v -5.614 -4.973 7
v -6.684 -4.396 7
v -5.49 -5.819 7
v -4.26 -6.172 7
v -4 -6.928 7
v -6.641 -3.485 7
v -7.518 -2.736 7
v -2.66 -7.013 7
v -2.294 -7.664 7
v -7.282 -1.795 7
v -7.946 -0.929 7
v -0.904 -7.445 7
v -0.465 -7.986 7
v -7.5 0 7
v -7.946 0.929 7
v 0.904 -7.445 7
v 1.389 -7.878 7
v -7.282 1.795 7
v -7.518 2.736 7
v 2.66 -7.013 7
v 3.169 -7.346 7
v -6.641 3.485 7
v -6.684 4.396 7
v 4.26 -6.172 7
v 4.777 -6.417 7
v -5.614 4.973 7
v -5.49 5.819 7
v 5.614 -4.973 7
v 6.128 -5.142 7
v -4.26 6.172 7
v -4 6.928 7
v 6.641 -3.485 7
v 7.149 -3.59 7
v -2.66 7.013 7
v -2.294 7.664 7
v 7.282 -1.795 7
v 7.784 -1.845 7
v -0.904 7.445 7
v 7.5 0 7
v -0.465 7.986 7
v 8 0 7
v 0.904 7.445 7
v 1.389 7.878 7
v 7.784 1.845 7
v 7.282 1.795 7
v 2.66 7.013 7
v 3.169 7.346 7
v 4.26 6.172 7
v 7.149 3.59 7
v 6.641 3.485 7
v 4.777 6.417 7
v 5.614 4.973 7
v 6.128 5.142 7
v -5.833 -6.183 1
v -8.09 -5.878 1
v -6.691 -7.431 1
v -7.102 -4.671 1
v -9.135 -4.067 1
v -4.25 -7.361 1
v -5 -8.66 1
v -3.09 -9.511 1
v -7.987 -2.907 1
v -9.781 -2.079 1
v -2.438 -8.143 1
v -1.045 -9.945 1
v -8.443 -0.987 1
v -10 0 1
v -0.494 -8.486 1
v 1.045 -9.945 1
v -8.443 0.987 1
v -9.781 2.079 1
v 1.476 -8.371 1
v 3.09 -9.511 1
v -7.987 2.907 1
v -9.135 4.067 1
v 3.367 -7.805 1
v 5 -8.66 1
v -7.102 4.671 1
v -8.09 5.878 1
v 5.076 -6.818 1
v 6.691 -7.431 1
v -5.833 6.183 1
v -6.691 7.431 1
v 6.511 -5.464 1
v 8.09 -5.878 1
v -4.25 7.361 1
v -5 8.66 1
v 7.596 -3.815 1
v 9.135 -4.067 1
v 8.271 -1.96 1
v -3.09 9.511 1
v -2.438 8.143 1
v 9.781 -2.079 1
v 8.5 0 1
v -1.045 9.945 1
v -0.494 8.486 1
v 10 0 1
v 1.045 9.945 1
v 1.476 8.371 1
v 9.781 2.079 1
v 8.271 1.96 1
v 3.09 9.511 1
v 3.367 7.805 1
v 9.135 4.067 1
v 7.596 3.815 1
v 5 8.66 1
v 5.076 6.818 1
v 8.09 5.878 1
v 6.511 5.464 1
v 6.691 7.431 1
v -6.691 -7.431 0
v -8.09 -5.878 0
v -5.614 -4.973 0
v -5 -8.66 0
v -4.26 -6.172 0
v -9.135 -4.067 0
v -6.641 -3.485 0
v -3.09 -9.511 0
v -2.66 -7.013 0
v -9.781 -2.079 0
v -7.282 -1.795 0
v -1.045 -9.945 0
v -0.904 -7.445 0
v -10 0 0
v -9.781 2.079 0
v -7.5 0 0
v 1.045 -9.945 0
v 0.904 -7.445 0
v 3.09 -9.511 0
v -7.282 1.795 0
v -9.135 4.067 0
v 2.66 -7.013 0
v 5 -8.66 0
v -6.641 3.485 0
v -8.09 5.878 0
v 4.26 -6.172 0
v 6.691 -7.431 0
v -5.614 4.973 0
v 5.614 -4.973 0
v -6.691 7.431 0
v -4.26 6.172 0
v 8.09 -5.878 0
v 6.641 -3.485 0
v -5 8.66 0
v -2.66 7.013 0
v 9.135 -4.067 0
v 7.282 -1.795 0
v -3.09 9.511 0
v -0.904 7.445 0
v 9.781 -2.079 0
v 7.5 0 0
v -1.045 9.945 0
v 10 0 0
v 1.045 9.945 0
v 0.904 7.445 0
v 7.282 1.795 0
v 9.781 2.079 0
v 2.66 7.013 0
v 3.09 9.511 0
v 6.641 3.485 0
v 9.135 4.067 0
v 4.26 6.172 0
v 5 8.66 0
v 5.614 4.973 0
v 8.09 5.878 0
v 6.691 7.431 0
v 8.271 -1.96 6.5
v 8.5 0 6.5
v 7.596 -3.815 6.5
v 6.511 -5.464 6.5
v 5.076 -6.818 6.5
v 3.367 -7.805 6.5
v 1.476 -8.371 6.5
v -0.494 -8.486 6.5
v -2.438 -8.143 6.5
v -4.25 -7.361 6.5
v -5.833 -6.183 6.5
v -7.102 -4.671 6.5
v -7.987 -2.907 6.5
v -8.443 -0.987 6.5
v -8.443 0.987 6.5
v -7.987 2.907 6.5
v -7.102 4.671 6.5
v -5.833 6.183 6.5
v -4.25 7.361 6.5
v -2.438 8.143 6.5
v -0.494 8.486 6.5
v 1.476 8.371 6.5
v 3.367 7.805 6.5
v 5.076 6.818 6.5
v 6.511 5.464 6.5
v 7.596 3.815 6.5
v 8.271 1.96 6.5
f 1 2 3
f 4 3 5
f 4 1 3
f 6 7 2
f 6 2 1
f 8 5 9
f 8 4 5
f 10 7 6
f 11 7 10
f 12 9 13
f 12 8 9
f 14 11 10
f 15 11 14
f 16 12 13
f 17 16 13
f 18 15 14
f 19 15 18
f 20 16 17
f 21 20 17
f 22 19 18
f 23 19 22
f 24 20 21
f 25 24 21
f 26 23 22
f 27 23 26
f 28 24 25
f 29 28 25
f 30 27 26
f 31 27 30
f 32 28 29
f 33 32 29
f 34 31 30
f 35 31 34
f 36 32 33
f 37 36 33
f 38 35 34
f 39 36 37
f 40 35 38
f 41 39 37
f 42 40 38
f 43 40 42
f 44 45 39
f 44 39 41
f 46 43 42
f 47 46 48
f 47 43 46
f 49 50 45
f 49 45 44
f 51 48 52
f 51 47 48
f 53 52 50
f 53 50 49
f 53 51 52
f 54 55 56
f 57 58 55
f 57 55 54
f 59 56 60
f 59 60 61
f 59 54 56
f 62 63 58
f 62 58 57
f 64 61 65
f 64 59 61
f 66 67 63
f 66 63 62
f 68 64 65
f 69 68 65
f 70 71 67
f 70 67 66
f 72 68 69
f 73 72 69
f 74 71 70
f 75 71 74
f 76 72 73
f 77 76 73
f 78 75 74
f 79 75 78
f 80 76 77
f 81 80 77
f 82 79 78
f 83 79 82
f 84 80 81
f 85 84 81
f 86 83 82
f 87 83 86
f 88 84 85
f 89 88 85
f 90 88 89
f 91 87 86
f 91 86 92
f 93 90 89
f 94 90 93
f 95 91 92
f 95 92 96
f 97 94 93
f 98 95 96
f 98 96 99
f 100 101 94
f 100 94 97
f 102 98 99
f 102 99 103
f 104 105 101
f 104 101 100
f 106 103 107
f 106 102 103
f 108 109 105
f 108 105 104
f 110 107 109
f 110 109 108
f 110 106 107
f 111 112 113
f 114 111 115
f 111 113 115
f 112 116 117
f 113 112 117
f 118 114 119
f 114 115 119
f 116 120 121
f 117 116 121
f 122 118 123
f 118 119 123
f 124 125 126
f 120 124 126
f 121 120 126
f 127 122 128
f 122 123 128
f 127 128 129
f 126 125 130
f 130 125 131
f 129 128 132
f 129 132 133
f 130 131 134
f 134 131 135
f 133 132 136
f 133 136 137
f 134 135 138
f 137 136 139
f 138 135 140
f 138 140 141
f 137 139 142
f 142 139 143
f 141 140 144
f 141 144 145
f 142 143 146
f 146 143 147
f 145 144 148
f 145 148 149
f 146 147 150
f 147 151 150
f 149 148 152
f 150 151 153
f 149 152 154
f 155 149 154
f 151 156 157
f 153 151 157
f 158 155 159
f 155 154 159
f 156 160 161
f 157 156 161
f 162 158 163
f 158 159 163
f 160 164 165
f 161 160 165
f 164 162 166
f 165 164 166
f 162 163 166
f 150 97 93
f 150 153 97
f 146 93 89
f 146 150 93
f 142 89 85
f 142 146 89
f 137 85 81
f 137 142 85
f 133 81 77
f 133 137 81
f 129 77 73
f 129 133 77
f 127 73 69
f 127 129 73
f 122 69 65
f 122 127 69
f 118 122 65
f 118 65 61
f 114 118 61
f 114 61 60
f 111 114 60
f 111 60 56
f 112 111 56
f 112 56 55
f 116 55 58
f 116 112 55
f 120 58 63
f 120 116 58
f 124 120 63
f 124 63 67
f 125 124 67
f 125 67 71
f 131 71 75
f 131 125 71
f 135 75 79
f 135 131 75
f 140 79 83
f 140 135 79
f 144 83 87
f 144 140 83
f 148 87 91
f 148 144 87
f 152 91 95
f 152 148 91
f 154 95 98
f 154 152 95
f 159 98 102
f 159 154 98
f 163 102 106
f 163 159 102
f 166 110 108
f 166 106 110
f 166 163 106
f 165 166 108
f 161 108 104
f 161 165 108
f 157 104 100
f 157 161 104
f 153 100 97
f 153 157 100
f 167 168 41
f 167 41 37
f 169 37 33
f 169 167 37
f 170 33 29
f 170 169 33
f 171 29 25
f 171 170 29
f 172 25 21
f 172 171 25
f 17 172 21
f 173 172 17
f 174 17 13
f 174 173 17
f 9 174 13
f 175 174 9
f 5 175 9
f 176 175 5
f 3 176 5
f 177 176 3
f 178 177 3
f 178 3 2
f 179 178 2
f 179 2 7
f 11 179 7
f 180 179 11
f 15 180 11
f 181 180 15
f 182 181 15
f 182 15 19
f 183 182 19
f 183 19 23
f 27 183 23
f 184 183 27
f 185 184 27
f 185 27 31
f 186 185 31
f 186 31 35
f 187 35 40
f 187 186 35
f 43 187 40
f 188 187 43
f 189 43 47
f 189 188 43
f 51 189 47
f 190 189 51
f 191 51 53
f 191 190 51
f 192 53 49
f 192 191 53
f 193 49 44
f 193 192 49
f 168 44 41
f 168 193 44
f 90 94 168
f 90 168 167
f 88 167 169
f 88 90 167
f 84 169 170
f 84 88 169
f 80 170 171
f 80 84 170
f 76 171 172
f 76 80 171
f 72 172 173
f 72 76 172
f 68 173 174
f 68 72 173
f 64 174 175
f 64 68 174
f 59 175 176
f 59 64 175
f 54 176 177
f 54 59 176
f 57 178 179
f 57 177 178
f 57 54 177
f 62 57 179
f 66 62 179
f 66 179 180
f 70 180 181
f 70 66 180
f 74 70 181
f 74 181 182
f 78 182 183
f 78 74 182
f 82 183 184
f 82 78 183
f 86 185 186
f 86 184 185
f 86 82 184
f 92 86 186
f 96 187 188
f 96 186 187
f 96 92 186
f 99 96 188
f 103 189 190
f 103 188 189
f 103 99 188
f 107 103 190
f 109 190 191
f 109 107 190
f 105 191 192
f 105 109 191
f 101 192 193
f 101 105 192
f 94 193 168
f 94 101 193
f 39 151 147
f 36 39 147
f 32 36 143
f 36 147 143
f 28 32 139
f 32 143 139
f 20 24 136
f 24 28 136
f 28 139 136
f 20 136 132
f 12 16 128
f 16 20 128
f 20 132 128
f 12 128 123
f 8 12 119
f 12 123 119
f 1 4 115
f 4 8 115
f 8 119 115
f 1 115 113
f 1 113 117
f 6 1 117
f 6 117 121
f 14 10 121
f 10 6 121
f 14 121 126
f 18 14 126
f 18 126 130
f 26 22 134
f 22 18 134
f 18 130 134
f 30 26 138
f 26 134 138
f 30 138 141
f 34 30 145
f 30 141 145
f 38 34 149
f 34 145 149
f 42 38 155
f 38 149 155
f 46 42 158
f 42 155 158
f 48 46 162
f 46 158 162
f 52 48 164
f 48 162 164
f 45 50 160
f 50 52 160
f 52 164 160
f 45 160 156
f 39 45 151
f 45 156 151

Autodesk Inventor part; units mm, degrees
ref_plane "YZ Plane" through (0, 0, 0) normal (1, 0, 0) x (0, 1, 0)
ref_plane "XZ Plane" through (0, 0, 0) normal (0, 1, 0) x (-1, 0, 0)
ref_plane "XY Plane" through (0, 0, 0) normal (0, 0, 1) x (1, 0, 0)
sketch "Sketch1" plane through (0, 0, 0) normal (0, 0, 1) x (1, 0, 0)
  circle A0 centre (0, 0) radius 7.5
  circle A1 centre (0, 0) radius 10
  dimension "d0" = 15
  dimension "d1" = 20
extrude "Extrusion1" add sketch "Sketch1" along normal blind 1
sketch "Sketch2" plane through (0, 0, 1) normal (0, 0, 1) x (1, 0, 0)
  circle A0 centre (0, 0) radius 8.5
  circle A1 centre (0, 0) radius 7.5 projected
  dimension "d4" = 17
extrude "Extrusion2" add sketch "Sketch2" along normal blind 6
chamfer "Chamfer1" distance 0.5 angle 45 1 edges at (-8.5, 0, 7)
properties part number "オイレス" material "Acetal Resin, Black"
